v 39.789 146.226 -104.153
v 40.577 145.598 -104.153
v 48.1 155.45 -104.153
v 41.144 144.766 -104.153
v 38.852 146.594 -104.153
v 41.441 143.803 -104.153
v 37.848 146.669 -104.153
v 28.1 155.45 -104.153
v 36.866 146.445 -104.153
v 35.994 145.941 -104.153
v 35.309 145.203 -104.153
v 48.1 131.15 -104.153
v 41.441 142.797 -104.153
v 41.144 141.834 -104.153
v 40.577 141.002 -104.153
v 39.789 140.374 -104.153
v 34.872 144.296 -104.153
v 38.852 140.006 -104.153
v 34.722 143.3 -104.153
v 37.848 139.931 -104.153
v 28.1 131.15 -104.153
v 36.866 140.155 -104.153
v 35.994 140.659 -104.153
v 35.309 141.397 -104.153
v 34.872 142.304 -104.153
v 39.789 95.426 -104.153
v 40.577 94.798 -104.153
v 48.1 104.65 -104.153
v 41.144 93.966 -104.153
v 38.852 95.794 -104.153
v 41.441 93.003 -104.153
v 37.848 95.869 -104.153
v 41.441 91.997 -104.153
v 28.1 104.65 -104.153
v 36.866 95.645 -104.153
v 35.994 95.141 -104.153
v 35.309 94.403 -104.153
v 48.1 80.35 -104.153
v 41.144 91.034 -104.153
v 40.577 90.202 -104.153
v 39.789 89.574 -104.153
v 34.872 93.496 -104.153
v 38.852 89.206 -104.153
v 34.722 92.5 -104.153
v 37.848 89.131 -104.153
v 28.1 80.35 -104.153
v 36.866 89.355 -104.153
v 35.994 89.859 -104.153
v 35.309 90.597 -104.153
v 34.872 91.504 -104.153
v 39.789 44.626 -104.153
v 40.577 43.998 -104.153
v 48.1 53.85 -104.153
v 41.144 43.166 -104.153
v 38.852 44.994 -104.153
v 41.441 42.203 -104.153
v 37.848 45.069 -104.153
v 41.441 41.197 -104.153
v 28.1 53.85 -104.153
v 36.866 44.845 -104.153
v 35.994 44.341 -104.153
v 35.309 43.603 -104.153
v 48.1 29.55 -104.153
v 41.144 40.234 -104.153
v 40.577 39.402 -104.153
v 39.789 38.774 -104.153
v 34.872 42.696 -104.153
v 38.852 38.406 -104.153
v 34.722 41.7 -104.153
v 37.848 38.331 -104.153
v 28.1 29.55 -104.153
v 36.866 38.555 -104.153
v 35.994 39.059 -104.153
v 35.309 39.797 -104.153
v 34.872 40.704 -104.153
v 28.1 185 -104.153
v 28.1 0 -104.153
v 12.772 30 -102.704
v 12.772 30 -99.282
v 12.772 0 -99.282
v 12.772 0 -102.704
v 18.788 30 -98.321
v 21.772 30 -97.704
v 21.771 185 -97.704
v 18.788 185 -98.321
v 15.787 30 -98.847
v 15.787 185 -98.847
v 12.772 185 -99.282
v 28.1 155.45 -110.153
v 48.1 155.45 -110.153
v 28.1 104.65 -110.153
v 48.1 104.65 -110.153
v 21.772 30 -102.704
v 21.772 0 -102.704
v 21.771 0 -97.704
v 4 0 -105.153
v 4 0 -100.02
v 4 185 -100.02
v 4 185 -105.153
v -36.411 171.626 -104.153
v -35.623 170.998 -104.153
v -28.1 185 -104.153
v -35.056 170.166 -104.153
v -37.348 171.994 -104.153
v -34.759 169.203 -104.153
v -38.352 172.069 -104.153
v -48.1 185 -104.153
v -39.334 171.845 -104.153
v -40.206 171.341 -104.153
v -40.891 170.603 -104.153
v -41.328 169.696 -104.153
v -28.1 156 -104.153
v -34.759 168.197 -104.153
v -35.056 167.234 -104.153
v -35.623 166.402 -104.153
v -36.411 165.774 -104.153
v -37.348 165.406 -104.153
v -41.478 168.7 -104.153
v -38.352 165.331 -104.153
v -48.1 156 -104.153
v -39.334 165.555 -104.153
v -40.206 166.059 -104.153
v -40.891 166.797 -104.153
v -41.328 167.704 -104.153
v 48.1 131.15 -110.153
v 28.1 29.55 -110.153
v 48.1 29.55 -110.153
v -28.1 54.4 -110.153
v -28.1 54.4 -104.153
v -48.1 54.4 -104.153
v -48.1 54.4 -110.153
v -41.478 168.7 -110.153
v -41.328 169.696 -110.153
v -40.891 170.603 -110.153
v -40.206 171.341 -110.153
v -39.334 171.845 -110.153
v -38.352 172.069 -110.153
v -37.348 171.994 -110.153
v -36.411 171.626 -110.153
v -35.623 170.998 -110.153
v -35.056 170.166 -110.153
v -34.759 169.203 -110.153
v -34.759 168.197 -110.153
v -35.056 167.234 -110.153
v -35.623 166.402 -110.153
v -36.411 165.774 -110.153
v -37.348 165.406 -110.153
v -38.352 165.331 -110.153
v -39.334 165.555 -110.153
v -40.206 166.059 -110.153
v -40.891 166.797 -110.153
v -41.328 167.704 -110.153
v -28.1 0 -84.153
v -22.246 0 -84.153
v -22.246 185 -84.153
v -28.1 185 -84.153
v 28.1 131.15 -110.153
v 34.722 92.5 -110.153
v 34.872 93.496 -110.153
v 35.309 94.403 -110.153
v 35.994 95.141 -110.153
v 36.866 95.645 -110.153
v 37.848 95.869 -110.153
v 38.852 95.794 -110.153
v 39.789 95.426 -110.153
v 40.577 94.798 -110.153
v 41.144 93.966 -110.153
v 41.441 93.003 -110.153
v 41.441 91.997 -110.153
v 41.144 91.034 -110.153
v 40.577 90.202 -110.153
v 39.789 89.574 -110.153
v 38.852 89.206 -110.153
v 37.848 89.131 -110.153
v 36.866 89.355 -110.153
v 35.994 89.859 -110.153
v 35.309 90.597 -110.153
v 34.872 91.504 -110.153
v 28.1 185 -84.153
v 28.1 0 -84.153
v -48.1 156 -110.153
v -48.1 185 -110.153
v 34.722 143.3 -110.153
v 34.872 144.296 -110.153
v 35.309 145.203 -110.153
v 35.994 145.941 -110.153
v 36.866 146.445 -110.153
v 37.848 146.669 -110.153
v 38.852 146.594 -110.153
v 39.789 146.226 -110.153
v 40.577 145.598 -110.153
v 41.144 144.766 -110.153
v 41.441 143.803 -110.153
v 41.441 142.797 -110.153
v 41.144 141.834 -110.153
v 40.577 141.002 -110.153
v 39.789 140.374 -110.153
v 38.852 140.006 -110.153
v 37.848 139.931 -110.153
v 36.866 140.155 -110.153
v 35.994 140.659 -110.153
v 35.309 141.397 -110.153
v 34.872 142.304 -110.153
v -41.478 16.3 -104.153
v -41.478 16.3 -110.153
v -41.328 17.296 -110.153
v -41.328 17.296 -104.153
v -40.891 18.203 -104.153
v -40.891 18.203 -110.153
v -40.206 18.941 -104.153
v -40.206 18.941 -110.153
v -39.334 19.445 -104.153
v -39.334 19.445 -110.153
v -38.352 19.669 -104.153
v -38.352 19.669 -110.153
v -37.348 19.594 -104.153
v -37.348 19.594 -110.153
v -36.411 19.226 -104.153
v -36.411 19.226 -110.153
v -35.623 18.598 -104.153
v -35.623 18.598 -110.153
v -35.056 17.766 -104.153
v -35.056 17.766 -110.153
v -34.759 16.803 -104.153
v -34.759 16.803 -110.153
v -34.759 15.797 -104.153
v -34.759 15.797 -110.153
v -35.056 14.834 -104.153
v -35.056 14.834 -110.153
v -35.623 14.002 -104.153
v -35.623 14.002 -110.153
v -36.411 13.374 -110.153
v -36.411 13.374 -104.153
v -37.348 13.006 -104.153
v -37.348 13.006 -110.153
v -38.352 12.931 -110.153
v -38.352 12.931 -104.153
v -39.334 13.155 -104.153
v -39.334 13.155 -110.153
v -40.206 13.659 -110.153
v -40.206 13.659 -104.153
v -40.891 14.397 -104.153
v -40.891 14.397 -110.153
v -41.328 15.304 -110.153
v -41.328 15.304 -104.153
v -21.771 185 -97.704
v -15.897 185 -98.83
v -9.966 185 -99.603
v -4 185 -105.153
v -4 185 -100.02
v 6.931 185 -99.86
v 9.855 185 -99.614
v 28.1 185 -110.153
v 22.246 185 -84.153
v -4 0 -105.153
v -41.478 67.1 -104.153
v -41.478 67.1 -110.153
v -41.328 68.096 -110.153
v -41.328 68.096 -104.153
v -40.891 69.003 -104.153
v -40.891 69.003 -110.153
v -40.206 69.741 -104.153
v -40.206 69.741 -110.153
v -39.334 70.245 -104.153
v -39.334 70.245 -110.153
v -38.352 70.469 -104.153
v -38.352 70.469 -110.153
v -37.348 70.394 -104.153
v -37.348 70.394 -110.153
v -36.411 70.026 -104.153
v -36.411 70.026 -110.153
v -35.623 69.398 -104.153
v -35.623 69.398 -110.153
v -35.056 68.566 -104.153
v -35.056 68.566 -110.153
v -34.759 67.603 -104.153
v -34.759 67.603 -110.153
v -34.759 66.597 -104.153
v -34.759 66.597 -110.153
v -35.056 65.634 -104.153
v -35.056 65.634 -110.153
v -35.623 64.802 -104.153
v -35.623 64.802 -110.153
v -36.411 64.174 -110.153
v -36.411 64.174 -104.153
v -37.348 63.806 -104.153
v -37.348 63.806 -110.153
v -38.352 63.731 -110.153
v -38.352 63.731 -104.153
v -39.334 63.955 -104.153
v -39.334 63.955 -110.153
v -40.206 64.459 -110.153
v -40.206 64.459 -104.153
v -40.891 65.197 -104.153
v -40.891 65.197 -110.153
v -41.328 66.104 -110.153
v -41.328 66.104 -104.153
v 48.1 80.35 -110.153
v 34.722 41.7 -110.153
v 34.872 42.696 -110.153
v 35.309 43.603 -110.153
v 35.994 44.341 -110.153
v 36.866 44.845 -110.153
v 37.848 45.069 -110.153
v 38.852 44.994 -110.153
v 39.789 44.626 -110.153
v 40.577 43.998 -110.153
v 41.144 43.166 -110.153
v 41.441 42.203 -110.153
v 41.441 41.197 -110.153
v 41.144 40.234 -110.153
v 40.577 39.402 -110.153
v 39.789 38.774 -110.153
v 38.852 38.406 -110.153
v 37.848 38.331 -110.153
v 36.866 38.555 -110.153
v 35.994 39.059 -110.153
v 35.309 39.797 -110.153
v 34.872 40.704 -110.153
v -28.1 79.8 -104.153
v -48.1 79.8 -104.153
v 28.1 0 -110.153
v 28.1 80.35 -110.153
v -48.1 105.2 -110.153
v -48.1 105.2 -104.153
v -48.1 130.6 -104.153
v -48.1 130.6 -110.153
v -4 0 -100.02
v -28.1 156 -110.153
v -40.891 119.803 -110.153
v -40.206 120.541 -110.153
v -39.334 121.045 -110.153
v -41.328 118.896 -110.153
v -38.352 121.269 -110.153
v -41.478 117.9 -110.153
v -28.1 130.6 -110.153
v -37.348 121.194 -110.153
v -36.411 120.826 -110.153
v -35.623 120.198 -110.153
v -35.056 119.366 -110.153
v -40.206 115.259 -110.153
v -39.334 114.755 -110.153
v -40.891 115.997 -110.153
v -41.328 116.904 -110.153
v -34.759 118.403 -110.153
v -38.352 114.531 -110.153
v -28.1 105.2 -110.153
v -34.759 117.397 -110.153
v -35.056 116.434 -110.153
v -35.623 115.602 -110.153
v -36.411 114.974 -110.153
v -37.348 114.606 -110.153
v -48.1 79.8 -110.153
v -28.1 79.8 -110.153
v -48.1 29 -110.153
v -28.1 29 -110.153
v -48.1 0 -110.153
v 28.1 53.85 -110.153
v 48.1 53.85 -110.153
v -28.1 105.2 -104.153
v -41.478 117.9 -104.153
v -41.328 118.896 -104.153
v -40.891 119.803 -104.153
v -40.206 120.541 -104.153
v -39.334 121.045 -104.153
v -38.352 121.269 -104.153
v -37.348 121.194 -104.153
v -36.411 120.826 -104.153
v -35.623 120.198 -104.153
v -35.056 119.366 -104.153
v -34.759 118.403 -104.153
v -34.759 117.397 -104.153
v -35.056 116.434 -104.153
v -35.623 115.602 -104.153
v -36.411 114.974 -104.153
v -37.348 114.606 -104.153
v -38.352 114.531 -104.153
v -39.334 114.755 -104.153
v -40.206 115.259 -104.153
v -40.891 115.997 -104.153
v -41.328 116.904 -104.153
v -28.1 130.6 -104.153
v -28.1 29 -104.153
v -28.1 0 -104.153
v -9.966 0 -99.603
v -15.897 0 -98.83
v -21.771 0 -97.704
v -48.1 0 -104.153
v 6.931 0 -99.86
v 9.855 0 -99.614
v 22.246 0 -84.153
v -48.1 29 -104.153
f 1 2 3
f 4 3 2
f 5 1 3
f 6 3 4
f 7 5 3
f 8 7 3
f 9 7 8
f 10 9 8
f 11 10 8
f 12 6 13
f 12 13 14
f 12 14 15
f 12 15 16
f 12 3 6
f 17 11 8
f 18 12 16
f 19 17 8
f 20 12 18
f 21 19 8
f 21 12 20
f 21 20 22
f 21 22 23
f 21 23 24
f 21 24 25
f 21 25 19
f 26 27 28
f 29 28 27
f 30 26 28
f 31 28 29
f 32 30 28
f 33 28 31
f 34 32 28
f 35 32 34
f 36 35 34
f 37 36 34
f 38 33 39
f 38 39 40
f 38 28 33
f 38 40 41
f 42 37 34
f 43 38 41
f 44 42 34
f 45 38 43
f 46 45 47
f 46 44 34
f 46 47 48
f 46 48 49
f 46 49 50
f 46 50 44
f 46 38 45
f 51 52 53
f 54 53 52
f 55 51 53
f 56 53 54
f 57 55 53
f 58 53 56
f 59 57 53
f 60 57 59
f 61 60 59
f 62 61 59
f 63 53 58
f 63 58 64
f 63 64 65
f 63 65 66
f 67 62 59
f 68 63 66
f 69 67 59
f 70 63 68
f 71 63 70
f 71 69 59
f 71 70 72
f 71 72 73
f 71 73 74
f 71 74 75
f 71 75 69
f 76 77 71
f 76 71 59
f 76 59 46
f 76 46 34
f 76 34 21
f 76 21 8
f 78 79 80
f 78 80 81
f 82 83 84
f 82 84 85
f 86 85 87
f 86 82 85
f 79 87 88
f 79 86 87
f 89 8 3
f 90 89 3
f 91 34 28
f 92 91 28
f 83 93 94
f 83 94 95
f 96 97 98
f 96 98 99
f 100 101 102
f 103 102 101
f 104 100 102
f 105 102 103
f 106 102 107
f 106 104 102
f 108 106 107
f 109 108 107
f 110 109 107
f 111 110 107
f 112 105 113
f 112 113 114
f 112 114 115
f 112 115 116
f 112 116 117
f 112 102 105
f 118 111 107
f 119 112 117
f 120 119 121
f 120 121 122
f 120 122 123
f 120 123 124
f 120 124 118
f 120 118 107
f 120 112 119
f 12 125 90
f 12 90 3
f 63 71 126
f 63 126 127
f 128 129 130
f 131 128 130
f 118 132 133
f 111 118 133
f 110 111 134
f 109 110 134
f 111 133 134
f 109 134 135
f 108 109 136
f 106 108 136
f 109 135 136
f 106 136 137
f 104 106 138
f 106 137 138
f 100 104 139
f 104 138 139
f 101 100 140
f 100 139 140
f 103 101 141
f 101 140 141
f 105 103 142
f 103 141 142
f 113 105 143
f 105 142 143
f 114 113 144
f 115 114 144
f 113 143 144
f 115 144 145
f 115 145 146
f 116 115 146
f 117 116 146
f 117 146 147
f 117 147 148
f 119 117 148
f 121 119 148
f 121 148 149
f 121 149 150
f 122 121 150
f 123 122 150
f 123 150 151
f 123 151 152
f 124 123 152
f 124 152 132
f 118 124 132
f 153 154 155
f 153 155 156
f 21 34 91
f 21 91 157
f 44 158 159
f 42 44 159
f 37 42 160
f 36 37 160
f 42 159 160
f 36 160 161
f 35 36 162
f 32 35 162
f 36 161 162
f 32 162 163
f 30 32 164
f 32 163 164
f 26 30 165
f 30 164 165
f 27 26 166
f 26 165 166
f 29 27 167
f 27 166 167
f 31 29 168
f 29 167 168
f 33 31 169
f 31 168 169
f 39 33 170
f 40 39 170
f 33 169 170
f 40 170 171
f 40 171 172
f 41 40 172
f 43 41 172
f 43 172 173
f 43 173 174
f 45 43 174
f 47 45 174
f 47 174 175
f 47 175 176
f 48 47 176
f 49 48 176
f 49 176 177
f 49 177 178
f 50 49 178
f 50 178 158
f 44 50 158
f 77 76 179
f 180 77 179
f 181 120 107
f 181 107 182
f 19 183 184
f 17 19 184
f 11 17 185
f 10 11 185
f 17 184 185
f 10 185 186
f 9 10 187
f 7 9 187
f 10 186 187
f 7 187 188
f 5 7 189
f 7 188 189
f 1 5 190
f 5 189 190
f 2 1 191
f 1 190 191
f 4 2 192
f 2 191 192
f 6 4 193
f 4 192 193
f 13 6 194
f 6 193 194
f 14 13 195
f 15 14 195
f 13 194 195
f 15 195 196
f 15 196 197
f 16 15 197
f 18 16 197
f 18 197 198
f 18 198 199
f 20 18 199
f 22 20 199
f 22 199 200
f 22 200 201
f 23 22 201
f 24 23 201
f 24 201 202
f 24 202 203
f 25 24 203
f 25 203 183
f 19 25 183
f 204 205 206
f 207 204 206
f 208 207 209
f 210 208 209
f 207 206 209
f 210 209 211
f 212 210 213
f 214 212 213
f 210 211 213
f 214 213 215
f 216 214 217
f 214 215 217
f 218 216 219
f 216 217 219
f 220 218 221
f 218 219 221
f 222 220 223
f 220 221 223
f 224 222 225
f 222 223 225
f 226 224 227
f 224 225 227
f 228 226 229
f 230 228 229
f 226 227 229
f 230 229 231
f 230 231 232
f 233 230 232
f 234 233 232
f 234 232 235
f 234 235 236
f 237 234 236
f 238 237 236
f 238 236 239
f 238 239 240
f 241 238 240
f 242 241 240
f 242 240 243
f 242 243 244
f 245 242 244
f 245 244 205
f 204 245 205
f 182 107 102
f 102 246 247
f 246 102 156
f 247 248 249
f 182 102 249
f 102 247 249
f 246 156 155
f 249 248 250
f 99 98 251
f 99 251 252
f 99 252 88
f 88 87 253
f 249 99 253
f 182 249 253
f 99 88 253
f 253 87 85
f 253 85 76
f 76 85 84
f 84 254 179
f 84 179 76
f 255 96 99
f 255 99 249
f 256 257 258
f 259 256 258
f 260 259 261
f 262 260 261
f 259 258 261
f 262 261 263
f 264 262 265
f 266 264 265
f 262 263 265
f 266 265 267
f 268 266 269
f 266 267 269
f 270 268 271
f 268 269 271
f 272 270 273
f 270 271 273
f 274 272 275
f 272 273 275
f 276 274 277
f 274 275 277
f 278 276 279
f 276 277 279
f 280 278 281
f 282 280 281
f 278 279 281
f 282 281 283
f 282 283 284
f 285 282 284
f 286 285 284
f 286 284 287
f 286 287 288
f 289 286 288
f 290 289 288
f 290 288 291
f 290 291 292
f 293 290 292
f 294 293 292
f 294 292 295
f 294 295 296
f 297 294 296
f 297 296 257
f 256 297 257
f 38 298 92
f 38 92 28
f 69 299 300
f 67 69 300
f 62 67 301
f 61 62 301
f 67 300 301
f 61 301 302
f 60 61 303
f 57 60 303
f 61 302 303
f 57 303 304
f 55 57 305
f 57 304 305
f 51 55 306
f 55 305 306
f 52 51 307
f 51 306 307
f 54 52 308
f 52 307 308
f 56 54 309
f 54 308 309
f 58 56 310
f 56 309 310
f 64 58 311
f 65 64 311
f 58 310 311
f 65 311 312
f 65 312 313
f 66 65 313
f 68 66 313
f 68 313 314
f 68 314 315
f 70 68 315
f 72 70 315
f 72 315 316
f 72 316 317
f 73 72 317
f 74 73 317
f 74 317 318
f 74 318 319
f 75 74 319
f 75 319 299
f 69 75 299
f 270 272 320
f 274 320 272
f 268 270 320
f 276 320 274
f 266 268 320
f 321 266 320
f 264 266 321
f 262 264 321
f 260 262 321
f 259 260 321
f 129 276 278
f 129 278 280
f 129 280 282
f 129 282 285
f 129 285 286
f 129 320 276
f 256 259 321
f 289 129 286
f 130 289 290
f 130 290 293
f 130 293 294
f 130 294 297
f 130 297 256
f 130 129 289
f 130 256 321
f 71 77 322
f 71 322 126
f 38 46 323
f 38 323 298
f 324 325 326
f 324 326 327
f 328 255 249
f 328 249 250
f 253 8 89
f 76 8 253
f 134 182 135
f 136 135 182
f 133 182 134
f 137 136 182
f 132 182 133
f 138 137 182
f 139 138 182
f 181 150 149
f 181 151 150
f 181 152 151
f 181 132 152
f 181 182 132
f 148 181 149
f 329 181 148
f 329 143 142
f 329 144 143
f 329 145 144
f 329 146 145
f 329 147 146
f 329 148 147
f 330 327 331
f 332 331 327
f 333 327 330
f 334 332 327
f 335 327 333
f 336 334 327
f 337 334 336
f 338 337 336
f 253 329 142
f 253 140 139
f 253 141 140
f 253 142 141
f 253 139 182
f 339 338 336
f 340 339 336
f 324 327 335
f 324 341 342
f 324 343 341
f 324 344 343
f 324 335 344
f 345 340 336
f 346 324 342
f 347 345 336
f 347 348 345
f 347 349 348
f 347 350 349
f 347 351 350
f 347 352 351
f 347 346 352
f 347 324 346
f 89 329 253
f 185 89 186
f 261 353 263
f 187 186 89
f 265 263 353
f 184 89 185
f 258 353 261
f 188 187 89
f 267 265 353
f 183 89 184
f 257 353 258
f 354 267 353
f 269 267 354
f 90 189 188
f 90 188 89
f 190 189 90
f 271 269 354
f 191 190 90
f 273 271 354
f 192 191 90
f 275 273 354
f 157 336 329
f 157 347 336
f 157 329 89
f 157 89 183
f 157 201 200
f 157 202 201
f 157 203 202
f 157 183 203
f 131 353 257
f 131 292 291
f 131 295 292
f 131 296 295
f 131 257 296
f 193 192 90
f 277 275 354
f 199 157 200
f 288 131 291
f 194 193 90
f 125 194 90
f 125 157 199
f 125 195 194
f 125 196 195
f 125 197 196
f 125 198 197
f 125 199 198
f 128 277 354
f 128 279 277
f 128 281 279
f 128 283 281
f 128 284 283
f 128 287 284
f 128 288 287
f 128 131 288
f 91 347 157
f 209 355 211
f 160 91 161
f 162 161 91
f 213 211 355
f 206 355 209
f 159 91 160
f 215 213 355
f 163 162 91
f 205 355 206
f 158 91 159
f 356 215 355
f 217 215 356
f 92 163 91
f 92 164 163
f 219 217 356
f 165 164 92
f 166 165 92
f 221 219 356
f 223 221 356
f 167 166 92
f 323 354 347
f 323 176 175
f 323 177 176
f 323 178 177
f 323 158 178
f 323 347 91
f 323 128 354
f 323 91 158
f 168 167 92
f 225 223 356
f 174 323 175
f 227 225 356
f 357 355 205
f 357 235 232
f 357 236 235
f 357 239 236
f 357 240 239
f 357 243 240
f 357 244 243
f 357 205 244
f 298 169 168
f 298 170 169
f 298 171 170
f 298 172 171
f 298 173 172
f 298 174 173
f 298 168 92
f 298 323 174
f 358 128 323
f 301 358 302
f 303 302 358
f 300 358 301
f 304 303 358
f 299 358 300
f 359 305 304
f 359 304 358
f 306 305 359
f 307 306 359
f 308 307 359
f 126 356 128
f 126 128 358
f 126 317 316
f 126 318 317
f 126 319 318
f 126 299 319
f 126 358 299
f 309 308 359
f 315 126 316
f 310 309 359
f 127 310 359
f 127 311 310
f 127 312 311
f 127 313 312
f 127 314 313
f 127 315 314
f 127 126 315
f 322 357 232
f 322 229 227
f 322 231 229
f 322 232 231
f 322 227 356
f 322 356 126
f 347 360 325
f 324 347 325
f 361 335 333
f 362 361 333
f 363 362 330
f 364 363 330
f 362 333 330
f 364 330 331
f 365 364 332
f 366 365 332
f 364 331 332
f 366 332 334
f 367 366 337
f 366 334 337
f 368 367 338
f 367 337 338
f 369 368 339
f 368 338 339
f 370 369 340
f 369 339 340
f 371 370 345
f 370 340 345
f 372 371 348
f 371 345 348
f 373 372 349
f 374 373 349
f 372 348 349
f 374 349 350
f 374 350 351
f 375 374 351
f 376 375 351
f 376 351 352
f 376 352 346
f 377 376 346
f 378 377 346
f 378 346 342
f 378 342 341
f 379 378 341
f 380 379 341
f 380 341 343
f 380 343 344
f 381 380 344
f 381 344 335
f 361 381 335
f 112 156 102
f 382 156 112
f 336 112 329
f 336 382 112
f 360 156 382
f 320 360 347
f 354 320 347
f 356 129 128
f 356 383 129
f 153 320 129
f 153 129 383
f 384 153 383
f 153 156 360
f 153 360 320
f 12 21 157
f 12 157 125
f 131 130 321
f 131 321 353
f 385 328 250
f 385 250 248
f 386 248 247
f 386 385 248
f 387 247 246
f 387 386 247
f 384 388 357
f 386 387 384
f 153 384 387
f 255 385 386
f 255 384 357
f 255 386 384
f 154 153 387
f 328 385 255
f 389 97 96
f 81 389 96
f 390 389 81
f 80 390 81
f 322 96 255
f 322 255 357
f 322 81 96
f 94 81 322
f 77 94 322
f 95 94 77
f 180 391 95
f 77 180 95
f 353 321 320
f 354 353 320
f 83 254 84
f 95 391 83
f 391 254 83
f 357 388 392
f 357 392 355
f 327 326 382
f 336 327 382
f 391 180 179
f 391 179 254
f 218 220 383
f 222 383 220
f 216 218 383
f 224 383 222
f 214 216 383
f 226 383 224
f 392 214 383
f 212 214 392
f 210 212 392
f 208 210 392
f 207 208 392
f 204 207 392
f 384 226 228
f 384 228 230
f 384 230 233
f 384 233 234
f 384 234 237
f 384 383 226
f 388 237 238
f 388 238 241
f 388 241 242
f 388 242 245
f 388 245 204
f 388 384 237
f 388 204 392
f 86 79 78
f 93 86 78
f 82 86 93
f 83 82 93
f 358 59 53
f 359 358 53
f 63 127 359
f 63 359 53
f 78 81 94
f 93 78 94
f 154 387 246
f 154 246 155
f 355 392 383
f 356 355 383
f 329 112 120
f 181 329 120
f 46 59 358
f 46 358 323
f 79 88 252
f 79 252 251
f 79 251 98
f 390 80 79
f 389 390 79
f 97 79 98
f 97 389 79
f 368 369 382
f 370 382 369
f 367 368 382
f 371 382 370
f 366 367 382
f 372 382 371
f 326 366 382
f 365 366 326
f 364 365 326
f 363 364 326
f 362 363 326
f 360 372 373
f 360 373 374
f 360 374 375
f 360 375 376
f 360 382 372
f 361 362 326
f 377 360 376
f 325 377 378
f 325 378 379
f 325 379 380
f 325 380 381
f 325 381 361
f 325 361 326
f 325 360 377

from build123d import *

# Parameters (mm, degrees)
F1_DEPTH = 185
F3_DEPTH = 30
F2_W     = 10
F2_H     = 12.7
F2_W_2   = 20
F2_H_2   = 29.6450595204
F2_H_3   = 26.5
F2_H_4   = 30.8181657076
F4_DEPTH = 25
F5_D     = 6.7564


# Not quite as in the source:
# - a feature names something its author has since deleted; it is built from what else it names


with BuildPart() as f1:
    # F0 (on Front) → F1 (new body)
    with BuildSketch(Plane.XZ):
        with BuildLine():
            Line((-28.0998, -84.153), (-28.0998, -96.0750292217))
            ThreePointArc((-28.0998, -96.0750292217), (-24.948943425, -96.9410141373), (-21.7715, -97.7036938286))
            Line((-21.7715, -97.7036938286), (-22.2458, -84.153))
            Line((-22.2458, -84.153), (-28.0998, -84.153))
        make_face()
        with BuildLine():
            ThreePointArc((-21.7715, -97.7036938286), (-24.948943425, -96.9410141373), (-28.0998, -96.0750292217))
            Line((-28.0998, -96.0750292217), (-28.0998, -104.153))
            Line((-28.0998, -104.153), (-48.0998, -104.153))
            Line((-48.0998, -104.153), (-48.0998, -110.153))
            Line((-48.0998, -110.153), (0, -110.153))
            Line((0, -110.153), (48.0998, -110.153))
            Line((48.0998, -110.153), (48.0998, -104.153))
            Line((48.0998, -104.153), (28.0998, -104.153))
            Line((28.0998, -104.153), (28.0998, -96.0750292217))
            ThreePointArc((28.0998, -96.0750292217), (24.948943425, -96.9410141373), (21.7715, -97.7036938286))
            Line((21.7715, -97.7036938286), (21.7715, -102.7036938286))
            Line((21.7715, -102.7036938286), (12.7715, -102.7036938286))
            Line((12.7715, -102.7036938286), (12.7715, -99.2819157135))
            ThreePointArc((12.7715, -99.2819157135), (8.3938675756, -99.747446018), (4, -100.0200479904))
            Line((4, -100.0200479904), (4, -105.1526938286))
            Line((4, -105.1526938286), (-4, -105.1526938286))
            Line((-4, -105.1526938286), (-4, -100.0200479904))
            ThreePointArc((-4, -100.0200479904), (-12.9376940454, -99.2603952883), (-21.7715, -97.7036938286))
        make_face()
        with BuildLine():
            ThreePointArc((21.7715, -97.7036938286), (24.948943425, -96.9410141373), (28.0998, -96.0750292217))
            Line((28.0998, -96.0750292217), (28.0998, -84.153))
            Line((28.0998, -84.153), (22.2458, -84.153))
            Line((22.2458, -84.153), (21.7715, -97.7036938286))
        make_face()
        with BuildLine():
            Line((21.7715, -102.7036938286), (21.7715, -97.7036938286))
            ThreePointArc((21.7715, -97.7036938286), (17.289517296, -98.5955505673), (12.7715, -99.2819157135))
            Line((12.7715, -99.2819157135), (12.7715, -102.7036938286))
            Line((12.7715, -102.7036938286), (21.7715, -102.7036938286))
        make_face()
    extrude(amount=-F1_DEPTH)

    # F0 (on Front) → F3 (cut)
    with BuildSketch(Plane.XZ):
        with BuildLine():
            Line((21.7715, -102.7036938286), (21.7715, -97.7036938286))
            ThreePointArc((21.7715, -97.7036938286), (17.289517296, -98.5955505673), (12.7715, -99.2819157135))
            Line((12.7715, -99.2819157135), (12.7715, -102.7036938286))
            Line((12.7715, -102.7036938286), (21.7715, -102.7036938286))
        make_face()
    extrude(amount=-F3_DEPTH, mode=Mode.SUBTRACT)

    # F2 (on face) → F4 (cut)
    with BuildSketch(Plane.XY.offset(-104.153)):
        Polygon((-48.0998, 29), (-38.0998, 29), (-38.0998, 41.7), (-38.0998, 54.4), (-48.0998, 54.4), align=None)
        with Locations((-33.0998, 35.35)):
            Rectangle(F2_W, F2_H)
        Polygon((-48.0998, 105.2), (-48.0998, 79.8), (-38.0998, 79.8), (-38.0998, 92.5), (-38.0998, 105.2), align=None)
        with Locations((-33.0998, 86.15)):
            Rectangle(F2_W, F2_H)
        Polygon((-48.0998, 156), (-48.0998, 130.6), (-38.0998, 130.6), (-38.0998, 143.3), (-38.0998, 156), align=None)
        with Locations((-33.0998, 136.95)):
            Rectangle(F2_W, F2_H)
        with Locations((-33.0998, 48.05)):
            Rectangle(F2_W, F2_H)
        with Locations((-33.0998, 98.85)):
            Rectangle(F2_W, F2_H)
        with Locations((-33.0998, 149.65)):
            Rectangle(F2_W, F2_H)
        with Locations((38.1002, 14.7274702398)):
            Rectangle(F2_W_2, F2_H_2)
        with Locations((38.1002, 67.1)):
            Rectangle(F2_W_2, F2_H_3)
        with Locations((38.1002, 117.9)):
            Rectangle(F2_W_2, F2_H_3)
        with Locations((38.1002, 170.8590828538)):
            Rectangle(F2_W_2, F2_H_4)
    extrude(amount=-F4_DEPTH, mode=Mode.SUBTRACT)

    # F5 (through all)
    with Locations(Plane.XY.offset(-104.153)):
        with Locations((-38.0998, 67.1), (-38.0998, 16.3), (-38.0998, 117.9), (-38.0998, 168.7), (38.1002, 92.5), (38.1002, 143.3), (38.1002, 41.7)):
            Hole(F5_D / 2)


solid = f1.part
